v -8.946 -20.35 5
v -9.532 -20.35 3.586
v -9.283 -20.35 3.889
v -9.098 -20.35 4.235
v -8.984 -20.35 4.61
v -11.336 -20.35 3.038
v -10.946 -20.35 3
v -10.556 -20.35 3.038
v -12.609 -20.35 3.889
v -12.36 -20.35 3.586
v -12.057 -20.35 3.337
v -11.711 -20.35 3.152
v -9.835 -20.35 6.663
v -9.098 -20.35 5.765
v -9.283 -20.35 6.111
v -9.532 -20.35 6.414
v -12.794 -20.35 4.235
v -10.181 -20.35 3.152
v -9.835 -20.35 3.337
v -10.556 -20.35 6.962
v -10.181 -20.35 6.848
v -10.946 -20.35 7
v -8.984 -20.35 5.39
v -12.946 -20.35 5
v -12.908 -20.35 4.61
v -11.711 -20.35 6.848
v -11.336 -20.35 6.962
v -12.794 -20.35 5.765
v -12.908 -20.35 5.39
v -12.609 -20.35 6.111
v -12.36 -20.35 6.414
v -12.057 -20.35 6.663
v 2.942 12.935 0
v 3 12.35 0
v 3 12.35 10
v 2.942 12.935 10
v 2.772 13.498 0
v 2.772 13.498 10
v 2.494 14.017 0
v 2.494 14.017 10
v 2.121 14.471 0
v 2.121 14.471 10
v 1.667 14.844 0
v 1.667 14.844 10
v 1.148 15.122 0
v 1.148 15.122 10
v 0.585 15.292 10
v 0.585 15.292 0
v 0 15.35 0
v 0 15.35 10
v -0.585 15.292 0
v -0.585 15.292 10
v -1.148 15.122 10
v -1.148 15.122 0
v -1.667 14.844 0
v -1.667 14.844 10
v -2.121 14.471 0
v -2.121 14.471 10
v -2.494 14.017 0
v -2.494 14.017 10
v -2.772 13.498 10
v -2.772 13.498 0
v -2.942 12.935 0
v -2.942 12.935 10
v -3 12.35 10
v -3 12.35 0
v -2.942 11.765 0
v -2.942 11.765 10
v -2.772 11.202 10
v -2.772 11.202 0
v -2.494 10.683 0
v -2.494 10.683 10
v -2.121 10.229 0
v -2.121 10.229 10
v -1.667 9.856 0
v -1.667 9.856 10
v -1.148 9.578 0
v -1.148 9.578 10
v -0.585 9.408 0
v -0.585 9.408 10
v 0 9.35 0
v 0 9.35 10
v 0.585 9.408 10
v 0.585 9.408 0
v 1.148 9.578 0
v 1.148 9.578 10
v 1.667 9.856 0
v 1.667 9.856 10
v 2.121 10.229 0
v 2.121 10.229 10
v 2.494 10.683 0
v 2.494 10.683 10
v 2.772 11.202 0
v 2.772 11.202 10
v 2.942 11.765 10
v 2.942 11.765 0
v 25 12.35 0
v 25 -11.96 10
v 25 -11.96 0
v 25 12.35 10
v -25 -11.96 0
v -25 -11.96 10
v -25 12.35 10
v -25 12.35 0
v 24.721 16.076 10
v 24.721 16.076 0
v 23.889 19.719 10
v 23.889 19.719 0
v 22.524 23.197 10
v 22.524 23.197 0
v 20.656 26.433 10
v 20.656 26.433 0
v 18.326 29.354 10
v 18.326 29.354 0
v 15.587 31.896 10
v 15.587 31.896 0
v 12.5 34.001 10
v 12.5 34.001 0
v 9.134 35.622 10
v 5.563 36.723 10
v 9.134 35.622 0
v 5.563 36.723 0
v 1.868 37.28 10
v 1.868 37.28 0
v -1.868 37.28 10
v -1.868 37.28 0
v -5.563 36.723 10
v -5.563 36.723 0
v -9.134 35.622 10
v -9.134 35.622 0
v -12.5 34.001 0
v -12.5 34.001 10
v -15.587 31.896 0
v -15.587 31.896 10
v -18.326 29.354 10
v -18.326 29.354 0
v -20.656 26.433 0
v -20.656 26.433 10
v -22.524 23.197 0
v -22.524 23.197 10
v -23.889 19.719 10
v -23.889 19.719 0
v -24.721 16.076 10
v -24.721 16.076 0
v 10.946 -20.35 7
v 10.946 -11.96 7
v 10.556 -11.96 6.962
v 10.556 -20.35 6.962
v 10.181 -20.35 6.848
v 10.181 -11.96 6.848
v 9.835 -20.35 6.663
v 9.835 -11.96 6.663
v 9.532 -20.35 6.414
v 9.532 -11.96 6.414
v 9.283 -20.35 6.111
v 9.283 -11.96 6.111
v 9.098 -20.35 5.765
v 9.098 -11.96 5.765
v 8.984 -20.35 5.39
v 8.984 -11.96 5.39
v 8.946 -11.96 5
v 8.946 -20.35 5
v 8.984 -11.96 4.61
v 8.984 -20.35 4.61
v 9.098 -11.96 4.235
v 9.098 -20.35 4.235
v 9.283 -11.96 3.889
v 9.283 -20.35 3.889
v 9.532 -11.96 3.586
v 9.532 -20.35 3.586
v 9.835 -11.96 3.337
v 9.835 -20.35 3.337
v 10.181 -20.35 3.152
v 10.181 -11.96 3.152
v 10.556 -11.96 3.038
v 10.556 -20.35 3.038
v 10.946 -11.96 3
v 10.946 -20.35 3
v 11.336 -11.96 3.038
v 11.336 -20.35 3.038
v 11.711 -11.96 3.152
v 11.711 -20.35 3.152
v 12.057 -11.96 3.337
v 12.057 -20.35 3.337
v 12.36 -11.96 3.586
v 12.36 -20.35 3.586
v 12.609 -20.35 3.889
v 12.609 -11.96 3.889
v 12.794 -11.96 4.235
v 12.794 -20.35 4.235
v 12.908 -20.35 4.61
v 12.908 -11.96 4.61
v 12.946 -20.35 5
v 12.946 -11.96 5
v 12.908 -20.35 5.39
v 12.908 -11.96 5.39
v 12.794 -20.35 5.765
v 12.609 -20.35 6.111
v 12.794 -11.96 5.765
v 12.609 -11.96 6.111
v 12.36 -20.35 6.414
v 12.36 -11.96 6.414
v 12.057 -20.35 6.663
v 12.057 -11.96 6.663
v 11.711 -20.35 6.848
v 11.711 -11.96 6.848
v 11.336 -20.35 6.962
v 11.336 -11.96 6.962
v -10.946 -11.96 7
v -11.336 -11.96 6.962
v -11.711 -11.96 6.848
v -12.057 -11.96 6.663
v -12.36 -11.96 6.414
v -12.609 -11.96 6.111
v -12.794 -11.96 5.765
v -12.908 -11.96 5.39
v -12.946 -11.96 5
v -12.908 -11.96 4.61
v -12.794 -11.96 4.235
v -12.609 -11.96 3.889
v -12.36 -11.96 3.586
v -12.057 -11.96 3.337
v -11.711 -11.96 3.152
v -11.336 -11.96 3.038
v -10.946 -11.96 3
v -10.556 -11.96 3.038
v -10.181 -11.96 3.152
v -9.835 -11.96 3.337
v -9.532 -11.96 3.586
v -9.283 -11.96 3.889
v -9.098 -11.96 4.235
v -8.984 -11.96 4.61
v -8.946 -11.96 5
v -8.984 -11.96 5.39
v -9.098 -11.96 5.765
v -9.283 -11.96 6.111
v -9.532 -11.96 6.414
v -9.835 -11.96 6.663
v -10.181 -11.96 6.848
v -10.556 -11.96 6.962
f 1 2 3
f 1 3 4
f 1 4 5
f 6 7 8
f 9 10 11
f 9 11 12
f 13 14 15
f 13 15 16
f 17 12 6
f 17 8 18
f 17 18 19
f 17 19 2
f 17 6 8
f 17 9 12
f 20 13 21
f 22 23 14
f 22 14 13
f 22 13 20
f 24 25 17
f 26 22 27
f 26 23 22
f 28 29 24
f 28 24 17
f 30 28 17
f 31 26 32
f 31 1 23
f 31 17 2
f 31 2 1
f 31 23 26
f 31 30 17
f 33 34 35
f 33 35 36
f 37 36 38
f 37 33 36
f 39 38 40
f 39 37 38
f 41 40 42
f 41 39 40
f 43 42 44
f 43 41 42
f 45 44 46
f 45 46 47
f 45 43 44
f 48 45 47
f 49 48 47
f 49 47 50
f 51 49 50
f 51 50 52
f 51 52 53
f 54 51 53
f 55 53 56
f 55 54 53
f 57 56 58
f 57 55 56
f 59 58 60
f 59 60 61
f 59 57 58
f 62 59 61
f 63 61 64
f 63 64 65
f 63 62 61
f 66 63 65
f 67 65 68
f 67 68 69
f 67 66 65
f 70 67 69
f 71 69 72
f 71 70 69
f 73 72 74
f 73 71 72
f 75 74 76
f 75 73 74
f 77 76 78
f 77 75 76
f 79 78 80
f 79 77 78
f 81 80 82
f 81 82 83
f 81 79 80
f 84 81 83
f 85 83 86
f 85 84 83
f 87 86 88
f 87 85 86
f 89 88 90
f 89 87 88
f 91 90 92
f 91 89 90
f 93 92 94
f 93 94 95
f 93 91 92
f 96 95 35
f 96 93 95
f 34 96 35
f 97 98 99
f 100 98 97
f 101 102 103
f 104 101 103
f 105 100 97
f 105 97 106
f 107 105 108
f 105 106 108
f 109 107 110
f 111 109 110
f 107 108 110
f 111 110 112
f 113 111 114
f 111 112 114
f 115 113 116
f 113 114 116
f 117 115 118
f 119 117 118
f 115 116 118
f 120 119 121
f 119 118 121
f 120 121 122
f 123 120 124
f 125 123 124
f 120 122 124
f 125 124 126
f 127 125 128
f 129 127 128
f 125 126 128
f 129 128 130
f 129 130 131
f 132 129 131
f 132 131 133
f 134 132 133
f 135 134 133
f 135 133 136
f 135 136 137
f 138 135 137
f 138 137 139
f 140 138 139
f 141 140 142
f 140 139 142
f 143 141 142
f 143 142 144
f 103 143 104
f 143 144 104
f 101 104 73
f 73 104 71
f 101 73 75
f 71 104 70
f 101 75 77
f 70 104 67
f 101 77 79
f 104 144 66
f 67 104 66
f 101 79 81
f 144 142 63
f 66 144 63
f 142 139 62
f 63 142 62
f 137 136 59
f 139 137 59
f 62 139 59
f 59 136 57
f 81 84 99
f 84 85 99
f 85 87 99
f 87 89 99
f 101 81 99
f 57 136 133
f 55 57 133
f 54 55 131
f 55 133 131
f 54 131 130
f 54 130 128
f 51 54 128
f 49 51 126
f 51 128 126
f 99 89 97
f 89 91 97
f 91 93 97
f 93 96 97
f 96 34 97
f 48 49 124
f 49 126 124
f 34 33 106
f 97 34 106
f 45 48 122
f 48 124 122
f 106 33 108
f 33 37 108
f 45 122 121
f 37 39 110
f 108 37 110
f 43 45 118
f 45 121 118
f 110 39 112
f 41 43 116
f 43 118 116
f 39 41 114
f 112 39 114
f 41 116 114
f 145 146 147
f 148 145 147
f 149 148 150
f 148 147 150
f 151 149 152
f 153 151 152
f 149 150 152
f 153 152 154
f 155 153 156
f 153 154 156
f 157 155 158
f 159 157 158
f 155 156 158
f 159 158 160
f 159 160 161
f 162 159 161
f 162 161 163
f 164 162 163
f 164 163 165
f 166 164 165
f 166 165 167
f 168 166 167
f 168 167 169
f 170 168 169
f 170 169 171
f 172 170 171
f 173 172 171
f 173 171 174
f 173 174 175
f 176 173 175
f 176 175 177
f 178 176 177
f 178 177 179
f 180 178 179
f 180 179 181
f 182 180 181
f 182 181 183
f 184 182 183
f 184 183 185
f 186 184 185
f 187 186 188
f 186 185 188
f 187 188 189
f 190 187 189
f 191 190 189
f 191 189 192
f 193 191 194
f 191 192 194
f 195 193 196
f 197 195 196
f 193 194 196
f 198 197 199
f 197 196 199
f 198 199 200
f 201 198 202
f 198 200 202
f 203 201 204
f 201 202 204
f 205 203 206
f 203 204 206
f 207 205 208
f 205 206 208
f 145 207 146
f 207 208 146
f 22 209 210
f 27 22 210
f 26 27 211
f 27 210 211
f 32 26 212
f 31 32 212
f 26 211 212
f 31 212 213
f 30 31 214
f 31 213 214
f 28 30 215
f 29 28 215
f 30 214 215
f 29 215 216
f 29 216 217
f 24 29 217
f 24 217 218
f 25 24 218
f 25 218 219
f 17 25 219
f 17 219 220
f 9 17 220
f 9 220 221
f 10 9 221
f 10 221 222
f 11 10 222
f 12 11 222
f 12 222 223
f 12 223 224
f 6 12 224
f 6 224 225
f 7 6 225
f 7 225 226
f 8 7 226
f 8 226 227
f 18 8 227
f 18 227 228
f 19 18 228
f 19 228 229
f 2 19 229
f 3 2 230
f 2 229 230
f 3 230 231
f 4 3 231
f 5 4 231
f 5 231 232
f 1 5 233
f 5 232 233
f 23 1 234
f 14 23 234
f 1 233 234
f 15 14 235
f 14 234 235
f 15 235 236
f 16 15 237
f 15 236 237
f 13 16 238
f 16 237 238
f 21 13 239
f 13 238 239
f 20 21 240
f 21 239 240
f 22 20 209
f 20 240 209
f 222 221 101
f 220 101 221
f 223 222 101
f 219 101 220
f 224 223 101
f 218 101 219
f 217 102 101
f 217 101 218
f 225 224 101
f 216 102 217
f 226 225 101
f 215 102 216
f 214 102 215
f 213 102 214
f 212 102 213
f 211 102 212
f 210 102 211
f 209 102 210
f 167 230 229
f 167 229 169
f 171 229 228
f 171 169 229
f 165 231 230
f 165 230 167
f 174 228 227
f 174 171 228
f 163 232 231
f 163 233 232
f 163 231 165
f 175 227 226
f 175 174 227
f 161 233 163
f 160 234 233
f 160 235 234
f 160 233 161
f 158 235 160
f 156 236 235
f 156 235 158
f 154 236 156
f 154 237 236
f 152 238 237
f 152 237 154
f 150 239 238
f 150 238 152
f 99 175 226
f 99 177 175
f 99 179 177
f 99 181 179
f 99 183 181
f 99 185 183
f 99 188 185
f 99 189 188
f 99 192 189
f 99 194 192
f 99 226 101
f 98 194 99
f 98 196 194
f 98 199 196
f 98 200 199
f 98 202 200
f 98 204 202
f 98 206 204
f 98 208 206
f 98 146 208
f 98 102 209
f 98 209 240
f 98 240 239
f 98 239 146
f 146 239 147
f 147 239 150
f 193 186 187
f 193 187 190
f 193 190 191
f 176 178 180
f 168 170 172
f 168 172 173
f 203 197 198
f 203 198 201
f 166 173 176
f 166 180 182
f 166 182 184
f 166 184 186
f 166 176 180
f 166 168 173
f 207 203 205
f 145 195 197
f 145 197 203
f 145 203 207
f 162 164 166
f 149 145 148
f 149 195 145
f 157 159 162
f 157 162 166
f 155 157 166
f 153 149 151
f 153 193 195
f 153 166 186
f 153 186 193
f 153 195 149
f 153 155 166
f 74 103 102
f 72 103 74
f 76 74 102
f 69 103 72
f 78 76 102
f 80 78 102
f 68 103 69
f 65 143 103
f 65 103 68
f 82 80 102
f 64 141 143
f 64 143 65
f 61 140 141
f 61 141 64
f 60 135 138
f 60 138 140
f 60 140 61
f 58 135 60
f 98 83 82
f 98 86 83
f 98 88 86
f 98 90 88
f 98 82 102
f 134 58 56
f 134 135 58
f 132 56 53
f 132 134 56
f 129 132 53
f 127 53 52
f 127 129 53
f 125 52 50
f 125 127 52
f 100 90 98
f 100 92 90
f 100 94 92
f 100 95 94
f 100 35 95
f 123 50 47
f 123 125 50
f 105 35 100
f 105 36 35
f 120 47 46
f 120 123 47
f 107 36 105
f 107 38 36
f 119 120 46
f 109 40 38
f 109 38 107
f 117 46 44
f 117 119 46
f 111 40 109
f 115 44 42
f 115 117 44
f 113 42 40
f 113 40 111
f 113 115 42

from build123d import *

# Parameters (mm, degrees)
ESQUISSE1_R             = 3
BOSS_EXTRU_1_DEPTH      = 10
ESQUISSE2_R             = 2
BOSS_EXTRU_2_DEPTH      = 8
ESQUISSE6_W             = 50
ESQUISSE6_H             = 0.42
BOSS_EXTRU_4_DEPTH      = 10
ESQUISSE7_W             = 50
ESQUISSE7_H             = 0.81
ENL_V_MAT_EXTRU_3_DEPTH = 10
ESQUISSE8_R             = 2
BOSS_EXTRU_5_DEPTH      = 8.39


with BuildPart() as part:
    # Esquisse1 → Boss.-Extru.1 (new body)
    with BuildSketch(Plane.XY):
        with BuildLine():
            Line((-25, -12.35), (25, -12.35))
            Line((25, -12.35), (25, 12.35))
            ThreePointArc((25, 12.35), (0, 37.35), (-25, 12.35))
            Line((-25, 12.35), (-25, -12.35))
        make_face()
        with Locations((0, 12.35)):
            Circle(ESQUISSE1_R, mode=Mode.SUBTRACT)
    extrude(amount=BOSS_EXTRU_1_DEPTH)

    # Esquisse2 → Boss.-Extru.2 (add)
    with BuildSketch(Plane.XZ.offset(12.35)):
        with Locations(Location((-10.94600496, 5, 0), (0, 0, 90))):
            Circle(ESQUISSE2_R)
        with Locations(Location((10.94600496, 5, 0), (0, 0, 90))):
            Circle(ESQUISSE2_R)
    extrude(amount=BOSS_EXTRU_2_DEPTH)

    # Esquisse6 → Boss.-Extru.4 (add)
    with BuildSketch(Plane.XY.offset(10)):
        with Locations((0, -12.56)):
            Rectangle(ESQUISSE6_W, ESQUISSE6_H)
    extrude(amount=-BOSS_EXTRU_4_DEPTH)

    # Esquisse7 → Enlèv. mat.-Extru.3 (cut)
    with BuildSketch(Plane.XY.offset(10)):
        with Locations((0, -12.365)):
            Rectangle(ESQUISSE7_W, ESQUISSE7_H)
    extrude(amount=-ENL_V_MAT_EXTRU_3_DEPTH, mode=Mode.SUBTRACT)


with BuildPart() as enl_v_mat_extru_3_piece_1:
    # of the separate pieces the step leaves, piece 1, a body of its own (enl_v_mat_extru_3_pieces)
    add(part.part.solids().sort_by_distance((-25, 12.35, 0))[0])



with BuildPart() as enl_v_mat_extru_3_piece_2:
    # of the separate pieces the step leaves, piece 2, a body of its own (enl_v_mat_extru_3_pieces)
    add(part.part.solids().sort_by_distance((-10.94600496, -12.77, 7))[0])


with BuildPart() as enl_v_mat_extru_3_piece_3:
    # of the separate pieces the step leaves, piece 3, a body of its own (enl_v_mat_extru_3_pieces)
    add(part.part.solids().sort_by_distance((10.94600496, -12.77, 7))[0])


with BuildPart() as enl_v_mat_extru_3_piece_1_1:
    add(enl_v_mat_extru_3_piece_1.part)

    add(enl_v_mat_extru_3_piece_2.part)  # Boss.-Extru.5 merges Enlèv. mat.-Extru.3 piece 2

    add(enl_v_mat_extru_3_piece_3.part)  # Boss.-Extru.5 merges Enlèv. mat.-Extru.3 piece 3
    # Esquisse8 → Boss.-Extru.5 (add)
    with BuildSketch(Plane.XZ.offset(11.96)):
        with Locations(Location((-10.94600496, 5, 0), (0, 0, 90))):
            Circle(ESQUISSE8_R)
        with Locations(Location((10.94600496, 5, 0), (0, 0, 90))):
            Circle(ESQUISSE8_R)
    extrude(amount=BOSS_EXTRU_5_DEPTH)


solid = enl_v_mat_extru_3_piece_1_1.part
